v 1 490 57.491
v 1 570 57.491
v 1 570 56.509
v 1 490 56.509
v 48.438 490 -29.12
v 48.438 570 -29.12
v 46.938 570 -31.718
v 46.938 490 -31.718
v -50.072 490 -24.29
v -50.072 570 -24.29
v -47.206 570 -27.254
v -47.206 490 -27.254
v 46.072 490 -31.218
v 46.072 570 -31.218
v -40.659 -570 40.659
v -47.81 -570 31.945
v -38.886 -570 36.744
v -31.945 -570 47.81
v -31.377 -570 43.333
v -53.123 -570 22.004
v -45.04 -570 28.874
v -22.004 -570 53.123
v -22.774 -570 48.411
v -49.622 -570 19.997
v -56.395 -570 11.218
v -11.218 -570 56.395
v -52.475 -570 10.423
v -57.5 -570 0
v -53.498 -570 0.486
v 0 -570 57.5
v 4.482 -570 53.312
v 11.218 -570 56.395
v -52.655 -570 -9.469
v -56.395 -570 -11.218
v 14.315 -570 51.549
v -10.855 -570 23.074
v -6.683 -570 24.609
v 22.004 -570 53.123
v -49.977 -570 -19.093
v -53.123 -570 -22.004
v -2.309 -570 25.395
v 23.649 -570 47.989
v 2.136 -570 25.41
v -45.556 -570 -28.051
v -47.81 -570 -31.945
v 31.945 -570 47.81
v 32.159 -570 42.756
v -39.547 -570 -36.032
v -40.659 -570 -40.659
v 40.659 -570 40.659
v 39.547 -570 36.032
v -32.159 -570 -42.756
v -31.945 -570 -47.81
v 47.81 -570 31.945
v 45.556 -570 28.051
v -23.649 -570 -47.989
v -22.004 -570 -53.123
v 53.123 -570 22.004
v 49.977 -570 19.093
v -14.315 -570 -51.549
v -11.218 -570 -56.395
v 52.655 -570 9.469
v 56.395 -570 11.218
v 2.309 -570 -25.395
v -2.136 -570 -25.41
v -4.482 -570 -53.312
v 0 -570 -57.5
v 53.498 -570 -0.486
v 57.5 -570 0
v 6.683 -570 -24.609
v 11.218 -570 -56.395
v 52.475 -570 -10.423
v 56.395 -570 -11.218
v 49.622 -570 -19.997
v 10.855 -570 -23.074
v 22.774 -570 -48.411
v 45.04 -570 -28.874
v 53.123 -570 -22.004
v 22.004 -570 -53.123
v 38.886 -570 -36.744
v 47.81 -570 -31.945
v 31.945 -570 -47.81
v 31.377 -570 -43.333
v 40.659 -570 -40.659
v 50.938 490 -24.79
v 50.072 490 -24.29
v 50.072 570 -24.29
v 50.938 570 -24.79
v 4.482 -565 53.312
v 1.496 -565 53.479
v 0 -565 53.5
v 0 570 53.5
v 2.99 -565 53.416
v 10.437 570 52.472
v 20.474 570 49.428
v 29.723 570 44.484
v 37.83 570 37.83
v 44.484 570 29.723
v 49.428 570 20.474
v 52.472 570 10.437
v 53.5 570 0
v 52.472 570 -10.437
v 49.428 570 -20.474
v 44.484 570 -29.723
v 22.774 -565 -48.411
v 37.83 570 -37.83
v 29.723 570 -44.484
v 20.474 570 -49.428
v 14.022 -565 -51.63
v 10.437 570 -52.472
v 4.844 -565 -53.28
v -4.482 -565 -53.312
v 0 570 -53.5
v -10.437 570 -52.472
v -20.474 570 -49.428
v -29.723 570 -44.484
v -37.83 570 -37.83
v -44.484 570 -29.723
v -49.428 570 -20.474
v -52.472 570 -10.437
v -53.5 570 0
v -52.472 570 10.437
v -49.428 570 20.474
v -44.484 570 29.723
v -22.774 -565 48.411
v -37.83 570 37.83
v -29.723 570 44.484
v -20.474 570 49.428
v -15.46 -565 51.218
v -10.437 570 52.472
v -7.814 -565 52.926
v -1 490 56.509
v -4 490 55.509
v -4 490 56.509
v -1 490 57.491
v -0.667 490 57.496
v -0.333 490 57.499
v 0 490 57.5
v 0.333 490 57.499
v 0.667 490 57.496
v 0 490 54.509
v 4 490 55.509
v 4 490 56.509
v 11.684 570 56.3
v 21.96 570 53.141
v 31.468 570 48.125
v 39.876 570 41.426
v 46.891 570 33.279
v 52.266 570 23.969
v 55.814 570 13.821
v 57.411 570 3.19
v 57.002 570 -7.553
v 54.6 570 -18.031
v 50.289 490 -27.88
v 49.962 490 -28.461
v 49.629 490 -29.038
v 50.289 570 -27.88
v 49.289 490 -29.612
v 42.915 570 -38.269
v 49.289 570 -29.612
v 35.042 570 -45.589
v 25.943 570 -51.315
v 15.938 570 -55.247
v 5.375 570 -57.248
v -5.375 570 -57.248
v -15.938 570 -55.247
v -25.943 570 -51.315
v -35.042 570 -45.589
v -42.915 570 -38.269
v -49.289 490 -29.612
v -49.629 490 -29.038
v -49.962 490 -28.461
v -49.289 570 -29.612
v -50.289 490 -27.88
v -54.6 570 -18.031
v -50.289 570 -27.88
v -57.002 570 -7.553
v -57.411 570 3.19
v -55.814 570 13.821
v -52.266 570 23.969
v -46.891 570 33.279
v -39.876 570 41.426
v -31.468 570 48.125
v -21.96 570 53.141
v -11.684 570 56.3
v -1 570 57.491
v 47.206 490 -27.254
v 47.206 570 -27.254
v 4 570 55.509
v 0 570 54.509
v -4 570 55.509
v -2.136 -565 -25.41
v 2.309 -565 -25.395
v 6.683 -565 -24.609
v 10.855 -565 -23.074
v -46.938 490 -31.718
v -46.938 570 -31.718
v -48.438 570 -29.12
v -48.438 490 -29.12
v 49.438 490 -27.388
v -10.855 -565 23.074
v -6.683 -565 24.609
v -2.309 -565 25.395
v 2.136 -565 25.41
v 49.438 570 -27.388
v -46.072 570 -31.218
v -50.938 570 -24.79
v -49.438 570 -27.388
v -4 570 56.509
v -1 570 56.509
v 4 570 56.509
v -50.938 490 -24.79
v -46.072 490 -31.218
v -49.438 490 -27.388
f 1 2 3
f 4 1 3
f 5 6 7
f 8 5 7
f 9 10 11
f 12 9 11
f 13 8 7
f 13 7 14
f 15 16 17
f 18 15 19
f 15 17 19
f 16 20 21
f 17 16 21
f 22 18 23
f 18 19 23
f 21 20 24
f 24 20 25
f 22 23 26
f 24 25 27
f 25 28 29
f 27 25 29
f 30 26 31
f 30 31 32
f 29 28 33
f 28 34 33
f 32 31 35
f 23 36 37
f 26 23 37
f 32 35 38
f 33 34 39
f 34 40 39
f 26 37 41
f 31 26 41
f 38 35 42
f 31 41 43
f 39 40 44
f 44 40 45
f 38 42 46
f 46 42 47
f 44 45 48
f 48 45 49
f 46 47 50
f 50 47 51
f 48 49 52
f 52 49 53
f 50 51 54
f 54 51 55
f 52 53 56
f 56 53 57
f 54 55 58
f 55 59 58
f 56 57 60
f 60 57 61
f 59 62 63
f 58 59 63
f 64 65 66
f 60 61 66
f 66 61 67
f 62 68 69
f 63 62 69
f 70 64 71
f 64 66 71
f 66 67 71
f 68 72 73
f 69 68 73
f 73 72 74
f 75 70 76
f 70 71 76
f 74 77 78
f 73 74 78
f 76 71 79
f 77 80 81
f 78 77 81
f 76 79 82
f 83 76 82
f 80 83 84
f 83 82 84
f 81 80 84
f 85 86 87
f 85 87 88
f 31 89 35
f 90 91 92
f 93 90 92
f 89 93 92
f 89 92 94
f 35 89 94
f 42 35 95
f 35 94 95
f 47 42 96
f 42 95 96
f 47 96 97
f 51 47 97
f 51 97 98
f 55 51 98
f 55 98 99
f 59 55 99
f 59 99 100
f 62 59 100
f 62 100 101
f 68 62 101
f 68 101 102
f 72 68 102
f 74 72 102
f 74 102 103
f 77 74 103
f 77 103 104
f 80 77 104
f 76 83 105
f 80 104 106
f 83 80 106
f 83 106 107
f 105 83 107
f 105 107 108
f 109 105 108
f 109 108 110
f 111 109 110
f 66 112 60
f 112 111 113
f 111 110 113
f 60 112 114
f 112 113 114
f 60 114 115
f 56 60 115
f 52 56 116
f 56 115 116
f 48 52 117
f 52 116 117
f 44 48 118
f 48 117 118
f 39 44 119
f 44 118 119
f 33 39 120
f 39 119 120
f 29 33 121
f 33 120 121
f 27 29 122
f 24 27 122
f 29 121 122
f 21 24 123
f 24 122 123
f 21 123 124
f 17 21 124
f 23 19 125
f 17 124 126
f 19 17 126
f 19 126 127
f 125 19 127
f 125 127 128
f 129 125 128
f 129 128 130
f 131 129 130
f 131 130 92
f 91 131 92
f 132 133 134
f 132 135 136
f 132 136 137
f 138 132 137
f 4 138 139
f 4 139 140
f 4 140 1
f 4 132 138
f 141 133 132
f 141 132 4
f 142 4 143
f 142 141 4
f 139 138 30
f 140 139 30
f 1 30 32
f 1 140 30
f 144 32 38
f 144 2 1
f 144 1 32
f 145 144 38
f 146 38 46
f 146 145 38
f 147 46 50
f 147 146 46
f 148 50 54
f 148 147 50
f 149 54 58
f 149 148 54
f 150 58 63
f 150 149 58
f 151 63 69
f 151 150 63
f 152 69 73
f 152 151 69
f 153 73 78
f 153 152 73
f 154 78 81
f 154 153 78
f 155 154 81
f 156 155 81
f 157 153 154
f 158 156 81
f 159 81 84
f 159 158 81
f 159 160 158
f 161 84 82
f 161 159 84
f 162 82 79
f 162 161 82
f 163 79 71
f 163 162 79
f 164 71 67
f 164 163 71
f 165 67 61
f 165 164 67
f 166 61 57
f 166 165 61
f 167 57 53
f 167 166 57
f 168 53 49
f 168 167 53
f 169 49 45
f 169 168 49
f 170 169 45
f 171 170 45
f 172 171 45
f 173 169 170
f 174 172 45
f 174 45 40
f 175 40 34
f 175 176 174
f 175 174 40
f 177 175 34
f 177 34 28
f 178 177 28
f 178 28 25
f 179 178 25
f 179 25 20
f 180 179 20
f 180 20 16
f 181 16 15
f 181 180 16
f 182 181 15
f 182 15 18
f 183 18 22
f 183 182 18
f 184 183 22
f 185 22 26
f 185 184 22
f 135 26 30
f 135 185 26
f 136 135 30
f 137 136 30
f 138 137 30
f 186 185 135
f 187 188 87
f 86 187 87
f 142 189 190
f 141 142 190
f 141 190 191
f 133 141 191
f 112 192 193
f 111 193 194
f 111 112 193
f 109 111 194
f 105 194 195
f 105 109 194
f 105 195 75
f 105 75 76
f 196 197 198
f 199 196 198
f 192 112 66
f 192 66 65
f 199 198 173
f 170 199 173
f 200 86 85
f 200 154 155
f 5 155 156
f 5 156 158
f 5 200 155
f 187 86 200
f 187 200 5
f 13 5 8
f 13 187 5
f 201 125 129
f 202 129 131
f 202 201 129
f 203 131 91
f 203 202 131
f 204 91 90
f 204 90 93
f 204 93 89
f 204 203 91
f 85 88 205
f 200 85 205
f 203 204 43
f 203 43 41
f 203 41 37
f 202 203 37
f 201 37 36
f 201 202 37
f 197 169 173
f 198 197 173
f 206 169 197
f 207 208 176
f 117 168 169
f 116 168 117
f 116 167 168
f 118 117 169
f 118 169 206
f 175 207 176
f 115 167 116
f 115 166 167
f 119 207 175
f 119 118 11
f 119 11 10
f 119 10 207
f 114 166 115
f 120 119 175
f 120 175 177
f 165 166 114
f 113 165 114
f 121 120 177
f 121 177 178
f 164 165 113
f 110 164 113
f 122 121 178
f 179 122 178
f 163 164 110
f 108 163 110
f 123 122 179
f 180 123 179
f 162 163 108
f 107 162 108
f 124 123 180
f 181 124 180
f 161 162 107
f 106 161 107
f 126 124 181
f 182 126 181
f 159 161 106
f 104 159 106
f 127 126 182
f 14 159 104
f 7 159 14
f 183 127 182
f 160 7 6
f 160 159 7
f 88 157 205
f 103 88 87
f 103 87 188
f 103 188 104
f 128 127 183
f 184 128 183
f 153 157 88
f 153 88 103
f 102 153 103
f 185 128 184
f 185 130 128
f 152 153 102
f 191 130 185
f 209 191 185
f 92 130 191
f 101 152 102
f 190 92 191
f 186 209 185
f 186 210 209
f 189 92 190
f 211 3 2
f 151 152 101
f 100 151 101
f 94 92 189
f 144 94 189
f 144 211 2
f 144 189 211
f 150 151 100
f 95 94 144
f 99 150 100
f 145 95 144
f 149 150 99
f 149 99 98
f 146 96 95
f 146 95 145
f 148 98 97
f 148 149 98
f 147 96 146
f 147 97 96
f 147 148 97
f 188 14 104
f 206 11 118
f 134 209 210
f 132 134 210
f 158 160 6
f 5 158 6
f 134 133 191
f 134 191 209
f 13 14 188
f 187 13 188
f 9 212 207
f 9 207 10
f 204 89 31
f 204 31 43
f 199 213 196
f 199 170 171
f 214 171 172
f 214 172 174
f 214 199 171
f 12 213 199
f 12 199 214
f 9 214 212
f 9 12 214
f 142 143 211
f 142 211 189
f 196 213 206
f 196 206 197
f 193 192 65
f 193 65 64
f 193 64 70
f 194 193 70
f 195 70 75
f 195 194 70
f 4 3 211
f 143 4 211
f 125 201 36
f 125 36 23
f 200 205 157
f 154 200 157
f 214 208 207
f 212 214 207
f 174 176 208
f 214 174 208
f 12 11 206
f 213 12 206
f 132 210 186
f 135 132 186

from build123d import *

# Parameters (mm, degrees)
SKETCH1_R           = 57.5
BOSS_EXTRUDE1_DEPTH = 570
SHELL1_T            = -4
CUT_EXTRUDE4_DEPTH  = 80
CIRPATTERN1_COUNT   = 3
BOSS_EXTRUDE3_START = -5
BOSS_EXTRUDE3_DEPTH = 5


with BuildPart() as part:
    # Sketch1 → Boss-Extrude1 (new, symmetric)
    with BuildSketch(Plane(origin=(0, 0, 0), x_dir=(1, 0, 0), z_dir=(0, 1, 0))):
        with Locations(Location((0, 0, 0), (0, 0, 270))):
            Circle(SKETCH1_R)
    extrude(amount=BOSS_EXTRUDE1_DEPTH, both=True)

    # Shell1
    shell1_openings = [part.faces().sort_by_distance(p)[0] for p in [
        (0, 570, 0),
        (0, -570, 0),
    ]]
    offset(amount=SHELL1_T, openings=shell1_openings, kind=Kind.INTERSECTION)

    # Sketch2 → Cut-Extrude4 (cut)
    with BuildSketch(Plane(origin=(0, 570, 0), x_dir=(1, 0, 0), z_dir=(0, 1, 0))):
        with BuildLine():
            Line((1, -57.49130369), (1, -56.50869631))
            Line((1, -56.50869631), (4, -56.50869631))
            Line((4, -56.50869631), (4, -55.50869631))
            Line((4, -55.50869631), (0, -54.50869631))
            Line((0, -54.50869631), (-4, -55.50869631))
            Line((-4, -55.50869631), (-4, -56.50869631))
            Line((-4, -56.50869631), (-1, -56.50869631))
            Line((-1, -56.50869631), (-1, -57.49130369))
            ThreePointArc((-1, -57.49130369), (0, -57.5), (1, -57.49130369))
        make_face()
    cut_extrude4 = extrude(amount=-CUT_EXTRUDE4_DEPTH, mode=Mode.SUBTRACT)

    # CirPattern1: Cut-Extrude4 ×3 about axis
    cirpattern1_axis = Axis((0, 0, 0), (0, 1, 0))
    for i in range(1, CIRPATTERN1_COUNT):
        add(cut_extrude4.rotate(cirpattern1_axis, i * 360 / CIRPATTERN1_COUNT), mode=Mode.SUBTRACT)

    # Sketch4 → Boss-Extrude3 (add)
    with BuildSketch(Plane(origin=(0, -570, 0), x_dir=(-1, 0, 0), z_dir=(0, -1, 0)).offset(BOSS_EXTRUDE3_START)):
        with BuildLine():
            Line((4.482088094, 53.311920677), (2.136322363, 25.410354715))
            ThreePointArc((2.136322363, 25.410354715), (-4.5131548, 25.097438789), (-10.855067921, 23.074173884))
            Line((-10.855067921, 23.074173884), (-22.774358187, 48.410521678))
            ThreePointArc((-22.774358187, 48.410521678), (-9.468775757, 52.655410792), (4.482088094, 53.311920677))
        make_face()
        with BuildLine():
            Line((-4.482088094, -53.311920677), (-2.136322363, -25.410354715))
            ThreePointArc((-2.136322363, -25.410354715), (4.5131548, -25.097438789), (10.855067921, -23.074173884))
            Line((10.855067921, -23.074173884), (22.774358187, -48.410521678))
            ThreePointArc((22.774358187, -48.410521678), (9.468775757, -52.655410792), (-4.482088094, -53.311920677))
        make_face()
    extrude(amount=BOSS_EXTRUDE3_DEPTH)


solid = part.part
